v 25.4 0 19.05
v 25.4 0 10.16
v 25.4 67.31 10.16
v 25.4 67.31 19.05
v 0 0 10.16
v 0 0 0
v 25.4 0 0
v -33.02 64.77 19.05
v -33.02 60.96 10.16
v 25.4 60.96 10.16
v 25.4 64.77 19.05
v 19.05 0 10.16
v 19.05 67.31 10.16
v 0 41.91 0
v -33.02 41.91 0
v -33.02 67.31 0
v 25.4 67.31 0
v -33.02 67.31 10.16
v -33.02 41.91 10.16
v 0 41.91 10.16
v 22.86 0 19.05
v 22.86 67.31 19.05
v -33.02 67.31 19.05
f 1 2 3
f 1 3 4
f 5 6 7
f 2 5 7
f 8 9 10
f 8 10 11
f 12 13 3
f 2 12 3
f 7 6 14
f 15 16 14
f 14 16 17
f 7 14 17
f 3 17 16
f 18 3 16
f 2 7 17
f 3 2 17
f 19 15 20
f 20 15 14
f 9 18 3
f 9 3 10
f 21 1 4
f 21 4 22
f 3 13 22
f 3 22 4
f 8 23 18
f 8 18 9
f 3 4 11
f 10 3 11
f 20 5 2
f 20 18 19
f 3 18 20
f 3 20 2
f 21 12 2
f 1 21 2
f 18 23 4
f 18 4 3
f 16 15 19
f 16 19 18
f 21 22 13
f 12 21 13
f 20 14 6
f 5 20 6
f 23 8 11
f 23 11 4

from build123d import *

# Parameters (mm, degrees)
F0_W     = 33.02
F0_H     = 25.4
F1_DEPTH = 10.16
F3_DEPTH = 67.31
F5_DEPTH = 58.42


with BuildPart() as f1:
    # F0 (on Top) → F1 (new body)
    with BuildSketch(Plane.XY):
        Polygon((0, 41.91), (0, 0), (25.4, 0), (25.4, 67.31), (0, 67.31), align=None)
        with Locations((-16.51, 54.61)):
            Rectangle(F0_W, F0_H)
    extrude(amount=F1_DEPTH)


with BuildPart() as f3:
    # F2 (on face) → F3 (new body)
    with BuildSketch(Plane.XZ):
        Polygon((19.05, 10.16), (25.4, 10.16), (25.4, 19.05), (22.86, 19.05), align=None)
    extrude(amount=-F3_DEPTH)


with BuildPart() as f5:
    # F4 (on face) → F5 (new body)
    with BuildSketch(Plane(origin=(-33.02, 0, 0), x_dir=(0, -1, 0), z_dir=(-1, 0, 0))):
        Polygon((-67.31, 19.05), (-67.31, 10.16), (-60.96, 10.16), (-64.77, 19.05), align=None)
    extrude(amount=-F5_DEPTH)


solid = Compound([f1.part, f3.part, f5.part])
